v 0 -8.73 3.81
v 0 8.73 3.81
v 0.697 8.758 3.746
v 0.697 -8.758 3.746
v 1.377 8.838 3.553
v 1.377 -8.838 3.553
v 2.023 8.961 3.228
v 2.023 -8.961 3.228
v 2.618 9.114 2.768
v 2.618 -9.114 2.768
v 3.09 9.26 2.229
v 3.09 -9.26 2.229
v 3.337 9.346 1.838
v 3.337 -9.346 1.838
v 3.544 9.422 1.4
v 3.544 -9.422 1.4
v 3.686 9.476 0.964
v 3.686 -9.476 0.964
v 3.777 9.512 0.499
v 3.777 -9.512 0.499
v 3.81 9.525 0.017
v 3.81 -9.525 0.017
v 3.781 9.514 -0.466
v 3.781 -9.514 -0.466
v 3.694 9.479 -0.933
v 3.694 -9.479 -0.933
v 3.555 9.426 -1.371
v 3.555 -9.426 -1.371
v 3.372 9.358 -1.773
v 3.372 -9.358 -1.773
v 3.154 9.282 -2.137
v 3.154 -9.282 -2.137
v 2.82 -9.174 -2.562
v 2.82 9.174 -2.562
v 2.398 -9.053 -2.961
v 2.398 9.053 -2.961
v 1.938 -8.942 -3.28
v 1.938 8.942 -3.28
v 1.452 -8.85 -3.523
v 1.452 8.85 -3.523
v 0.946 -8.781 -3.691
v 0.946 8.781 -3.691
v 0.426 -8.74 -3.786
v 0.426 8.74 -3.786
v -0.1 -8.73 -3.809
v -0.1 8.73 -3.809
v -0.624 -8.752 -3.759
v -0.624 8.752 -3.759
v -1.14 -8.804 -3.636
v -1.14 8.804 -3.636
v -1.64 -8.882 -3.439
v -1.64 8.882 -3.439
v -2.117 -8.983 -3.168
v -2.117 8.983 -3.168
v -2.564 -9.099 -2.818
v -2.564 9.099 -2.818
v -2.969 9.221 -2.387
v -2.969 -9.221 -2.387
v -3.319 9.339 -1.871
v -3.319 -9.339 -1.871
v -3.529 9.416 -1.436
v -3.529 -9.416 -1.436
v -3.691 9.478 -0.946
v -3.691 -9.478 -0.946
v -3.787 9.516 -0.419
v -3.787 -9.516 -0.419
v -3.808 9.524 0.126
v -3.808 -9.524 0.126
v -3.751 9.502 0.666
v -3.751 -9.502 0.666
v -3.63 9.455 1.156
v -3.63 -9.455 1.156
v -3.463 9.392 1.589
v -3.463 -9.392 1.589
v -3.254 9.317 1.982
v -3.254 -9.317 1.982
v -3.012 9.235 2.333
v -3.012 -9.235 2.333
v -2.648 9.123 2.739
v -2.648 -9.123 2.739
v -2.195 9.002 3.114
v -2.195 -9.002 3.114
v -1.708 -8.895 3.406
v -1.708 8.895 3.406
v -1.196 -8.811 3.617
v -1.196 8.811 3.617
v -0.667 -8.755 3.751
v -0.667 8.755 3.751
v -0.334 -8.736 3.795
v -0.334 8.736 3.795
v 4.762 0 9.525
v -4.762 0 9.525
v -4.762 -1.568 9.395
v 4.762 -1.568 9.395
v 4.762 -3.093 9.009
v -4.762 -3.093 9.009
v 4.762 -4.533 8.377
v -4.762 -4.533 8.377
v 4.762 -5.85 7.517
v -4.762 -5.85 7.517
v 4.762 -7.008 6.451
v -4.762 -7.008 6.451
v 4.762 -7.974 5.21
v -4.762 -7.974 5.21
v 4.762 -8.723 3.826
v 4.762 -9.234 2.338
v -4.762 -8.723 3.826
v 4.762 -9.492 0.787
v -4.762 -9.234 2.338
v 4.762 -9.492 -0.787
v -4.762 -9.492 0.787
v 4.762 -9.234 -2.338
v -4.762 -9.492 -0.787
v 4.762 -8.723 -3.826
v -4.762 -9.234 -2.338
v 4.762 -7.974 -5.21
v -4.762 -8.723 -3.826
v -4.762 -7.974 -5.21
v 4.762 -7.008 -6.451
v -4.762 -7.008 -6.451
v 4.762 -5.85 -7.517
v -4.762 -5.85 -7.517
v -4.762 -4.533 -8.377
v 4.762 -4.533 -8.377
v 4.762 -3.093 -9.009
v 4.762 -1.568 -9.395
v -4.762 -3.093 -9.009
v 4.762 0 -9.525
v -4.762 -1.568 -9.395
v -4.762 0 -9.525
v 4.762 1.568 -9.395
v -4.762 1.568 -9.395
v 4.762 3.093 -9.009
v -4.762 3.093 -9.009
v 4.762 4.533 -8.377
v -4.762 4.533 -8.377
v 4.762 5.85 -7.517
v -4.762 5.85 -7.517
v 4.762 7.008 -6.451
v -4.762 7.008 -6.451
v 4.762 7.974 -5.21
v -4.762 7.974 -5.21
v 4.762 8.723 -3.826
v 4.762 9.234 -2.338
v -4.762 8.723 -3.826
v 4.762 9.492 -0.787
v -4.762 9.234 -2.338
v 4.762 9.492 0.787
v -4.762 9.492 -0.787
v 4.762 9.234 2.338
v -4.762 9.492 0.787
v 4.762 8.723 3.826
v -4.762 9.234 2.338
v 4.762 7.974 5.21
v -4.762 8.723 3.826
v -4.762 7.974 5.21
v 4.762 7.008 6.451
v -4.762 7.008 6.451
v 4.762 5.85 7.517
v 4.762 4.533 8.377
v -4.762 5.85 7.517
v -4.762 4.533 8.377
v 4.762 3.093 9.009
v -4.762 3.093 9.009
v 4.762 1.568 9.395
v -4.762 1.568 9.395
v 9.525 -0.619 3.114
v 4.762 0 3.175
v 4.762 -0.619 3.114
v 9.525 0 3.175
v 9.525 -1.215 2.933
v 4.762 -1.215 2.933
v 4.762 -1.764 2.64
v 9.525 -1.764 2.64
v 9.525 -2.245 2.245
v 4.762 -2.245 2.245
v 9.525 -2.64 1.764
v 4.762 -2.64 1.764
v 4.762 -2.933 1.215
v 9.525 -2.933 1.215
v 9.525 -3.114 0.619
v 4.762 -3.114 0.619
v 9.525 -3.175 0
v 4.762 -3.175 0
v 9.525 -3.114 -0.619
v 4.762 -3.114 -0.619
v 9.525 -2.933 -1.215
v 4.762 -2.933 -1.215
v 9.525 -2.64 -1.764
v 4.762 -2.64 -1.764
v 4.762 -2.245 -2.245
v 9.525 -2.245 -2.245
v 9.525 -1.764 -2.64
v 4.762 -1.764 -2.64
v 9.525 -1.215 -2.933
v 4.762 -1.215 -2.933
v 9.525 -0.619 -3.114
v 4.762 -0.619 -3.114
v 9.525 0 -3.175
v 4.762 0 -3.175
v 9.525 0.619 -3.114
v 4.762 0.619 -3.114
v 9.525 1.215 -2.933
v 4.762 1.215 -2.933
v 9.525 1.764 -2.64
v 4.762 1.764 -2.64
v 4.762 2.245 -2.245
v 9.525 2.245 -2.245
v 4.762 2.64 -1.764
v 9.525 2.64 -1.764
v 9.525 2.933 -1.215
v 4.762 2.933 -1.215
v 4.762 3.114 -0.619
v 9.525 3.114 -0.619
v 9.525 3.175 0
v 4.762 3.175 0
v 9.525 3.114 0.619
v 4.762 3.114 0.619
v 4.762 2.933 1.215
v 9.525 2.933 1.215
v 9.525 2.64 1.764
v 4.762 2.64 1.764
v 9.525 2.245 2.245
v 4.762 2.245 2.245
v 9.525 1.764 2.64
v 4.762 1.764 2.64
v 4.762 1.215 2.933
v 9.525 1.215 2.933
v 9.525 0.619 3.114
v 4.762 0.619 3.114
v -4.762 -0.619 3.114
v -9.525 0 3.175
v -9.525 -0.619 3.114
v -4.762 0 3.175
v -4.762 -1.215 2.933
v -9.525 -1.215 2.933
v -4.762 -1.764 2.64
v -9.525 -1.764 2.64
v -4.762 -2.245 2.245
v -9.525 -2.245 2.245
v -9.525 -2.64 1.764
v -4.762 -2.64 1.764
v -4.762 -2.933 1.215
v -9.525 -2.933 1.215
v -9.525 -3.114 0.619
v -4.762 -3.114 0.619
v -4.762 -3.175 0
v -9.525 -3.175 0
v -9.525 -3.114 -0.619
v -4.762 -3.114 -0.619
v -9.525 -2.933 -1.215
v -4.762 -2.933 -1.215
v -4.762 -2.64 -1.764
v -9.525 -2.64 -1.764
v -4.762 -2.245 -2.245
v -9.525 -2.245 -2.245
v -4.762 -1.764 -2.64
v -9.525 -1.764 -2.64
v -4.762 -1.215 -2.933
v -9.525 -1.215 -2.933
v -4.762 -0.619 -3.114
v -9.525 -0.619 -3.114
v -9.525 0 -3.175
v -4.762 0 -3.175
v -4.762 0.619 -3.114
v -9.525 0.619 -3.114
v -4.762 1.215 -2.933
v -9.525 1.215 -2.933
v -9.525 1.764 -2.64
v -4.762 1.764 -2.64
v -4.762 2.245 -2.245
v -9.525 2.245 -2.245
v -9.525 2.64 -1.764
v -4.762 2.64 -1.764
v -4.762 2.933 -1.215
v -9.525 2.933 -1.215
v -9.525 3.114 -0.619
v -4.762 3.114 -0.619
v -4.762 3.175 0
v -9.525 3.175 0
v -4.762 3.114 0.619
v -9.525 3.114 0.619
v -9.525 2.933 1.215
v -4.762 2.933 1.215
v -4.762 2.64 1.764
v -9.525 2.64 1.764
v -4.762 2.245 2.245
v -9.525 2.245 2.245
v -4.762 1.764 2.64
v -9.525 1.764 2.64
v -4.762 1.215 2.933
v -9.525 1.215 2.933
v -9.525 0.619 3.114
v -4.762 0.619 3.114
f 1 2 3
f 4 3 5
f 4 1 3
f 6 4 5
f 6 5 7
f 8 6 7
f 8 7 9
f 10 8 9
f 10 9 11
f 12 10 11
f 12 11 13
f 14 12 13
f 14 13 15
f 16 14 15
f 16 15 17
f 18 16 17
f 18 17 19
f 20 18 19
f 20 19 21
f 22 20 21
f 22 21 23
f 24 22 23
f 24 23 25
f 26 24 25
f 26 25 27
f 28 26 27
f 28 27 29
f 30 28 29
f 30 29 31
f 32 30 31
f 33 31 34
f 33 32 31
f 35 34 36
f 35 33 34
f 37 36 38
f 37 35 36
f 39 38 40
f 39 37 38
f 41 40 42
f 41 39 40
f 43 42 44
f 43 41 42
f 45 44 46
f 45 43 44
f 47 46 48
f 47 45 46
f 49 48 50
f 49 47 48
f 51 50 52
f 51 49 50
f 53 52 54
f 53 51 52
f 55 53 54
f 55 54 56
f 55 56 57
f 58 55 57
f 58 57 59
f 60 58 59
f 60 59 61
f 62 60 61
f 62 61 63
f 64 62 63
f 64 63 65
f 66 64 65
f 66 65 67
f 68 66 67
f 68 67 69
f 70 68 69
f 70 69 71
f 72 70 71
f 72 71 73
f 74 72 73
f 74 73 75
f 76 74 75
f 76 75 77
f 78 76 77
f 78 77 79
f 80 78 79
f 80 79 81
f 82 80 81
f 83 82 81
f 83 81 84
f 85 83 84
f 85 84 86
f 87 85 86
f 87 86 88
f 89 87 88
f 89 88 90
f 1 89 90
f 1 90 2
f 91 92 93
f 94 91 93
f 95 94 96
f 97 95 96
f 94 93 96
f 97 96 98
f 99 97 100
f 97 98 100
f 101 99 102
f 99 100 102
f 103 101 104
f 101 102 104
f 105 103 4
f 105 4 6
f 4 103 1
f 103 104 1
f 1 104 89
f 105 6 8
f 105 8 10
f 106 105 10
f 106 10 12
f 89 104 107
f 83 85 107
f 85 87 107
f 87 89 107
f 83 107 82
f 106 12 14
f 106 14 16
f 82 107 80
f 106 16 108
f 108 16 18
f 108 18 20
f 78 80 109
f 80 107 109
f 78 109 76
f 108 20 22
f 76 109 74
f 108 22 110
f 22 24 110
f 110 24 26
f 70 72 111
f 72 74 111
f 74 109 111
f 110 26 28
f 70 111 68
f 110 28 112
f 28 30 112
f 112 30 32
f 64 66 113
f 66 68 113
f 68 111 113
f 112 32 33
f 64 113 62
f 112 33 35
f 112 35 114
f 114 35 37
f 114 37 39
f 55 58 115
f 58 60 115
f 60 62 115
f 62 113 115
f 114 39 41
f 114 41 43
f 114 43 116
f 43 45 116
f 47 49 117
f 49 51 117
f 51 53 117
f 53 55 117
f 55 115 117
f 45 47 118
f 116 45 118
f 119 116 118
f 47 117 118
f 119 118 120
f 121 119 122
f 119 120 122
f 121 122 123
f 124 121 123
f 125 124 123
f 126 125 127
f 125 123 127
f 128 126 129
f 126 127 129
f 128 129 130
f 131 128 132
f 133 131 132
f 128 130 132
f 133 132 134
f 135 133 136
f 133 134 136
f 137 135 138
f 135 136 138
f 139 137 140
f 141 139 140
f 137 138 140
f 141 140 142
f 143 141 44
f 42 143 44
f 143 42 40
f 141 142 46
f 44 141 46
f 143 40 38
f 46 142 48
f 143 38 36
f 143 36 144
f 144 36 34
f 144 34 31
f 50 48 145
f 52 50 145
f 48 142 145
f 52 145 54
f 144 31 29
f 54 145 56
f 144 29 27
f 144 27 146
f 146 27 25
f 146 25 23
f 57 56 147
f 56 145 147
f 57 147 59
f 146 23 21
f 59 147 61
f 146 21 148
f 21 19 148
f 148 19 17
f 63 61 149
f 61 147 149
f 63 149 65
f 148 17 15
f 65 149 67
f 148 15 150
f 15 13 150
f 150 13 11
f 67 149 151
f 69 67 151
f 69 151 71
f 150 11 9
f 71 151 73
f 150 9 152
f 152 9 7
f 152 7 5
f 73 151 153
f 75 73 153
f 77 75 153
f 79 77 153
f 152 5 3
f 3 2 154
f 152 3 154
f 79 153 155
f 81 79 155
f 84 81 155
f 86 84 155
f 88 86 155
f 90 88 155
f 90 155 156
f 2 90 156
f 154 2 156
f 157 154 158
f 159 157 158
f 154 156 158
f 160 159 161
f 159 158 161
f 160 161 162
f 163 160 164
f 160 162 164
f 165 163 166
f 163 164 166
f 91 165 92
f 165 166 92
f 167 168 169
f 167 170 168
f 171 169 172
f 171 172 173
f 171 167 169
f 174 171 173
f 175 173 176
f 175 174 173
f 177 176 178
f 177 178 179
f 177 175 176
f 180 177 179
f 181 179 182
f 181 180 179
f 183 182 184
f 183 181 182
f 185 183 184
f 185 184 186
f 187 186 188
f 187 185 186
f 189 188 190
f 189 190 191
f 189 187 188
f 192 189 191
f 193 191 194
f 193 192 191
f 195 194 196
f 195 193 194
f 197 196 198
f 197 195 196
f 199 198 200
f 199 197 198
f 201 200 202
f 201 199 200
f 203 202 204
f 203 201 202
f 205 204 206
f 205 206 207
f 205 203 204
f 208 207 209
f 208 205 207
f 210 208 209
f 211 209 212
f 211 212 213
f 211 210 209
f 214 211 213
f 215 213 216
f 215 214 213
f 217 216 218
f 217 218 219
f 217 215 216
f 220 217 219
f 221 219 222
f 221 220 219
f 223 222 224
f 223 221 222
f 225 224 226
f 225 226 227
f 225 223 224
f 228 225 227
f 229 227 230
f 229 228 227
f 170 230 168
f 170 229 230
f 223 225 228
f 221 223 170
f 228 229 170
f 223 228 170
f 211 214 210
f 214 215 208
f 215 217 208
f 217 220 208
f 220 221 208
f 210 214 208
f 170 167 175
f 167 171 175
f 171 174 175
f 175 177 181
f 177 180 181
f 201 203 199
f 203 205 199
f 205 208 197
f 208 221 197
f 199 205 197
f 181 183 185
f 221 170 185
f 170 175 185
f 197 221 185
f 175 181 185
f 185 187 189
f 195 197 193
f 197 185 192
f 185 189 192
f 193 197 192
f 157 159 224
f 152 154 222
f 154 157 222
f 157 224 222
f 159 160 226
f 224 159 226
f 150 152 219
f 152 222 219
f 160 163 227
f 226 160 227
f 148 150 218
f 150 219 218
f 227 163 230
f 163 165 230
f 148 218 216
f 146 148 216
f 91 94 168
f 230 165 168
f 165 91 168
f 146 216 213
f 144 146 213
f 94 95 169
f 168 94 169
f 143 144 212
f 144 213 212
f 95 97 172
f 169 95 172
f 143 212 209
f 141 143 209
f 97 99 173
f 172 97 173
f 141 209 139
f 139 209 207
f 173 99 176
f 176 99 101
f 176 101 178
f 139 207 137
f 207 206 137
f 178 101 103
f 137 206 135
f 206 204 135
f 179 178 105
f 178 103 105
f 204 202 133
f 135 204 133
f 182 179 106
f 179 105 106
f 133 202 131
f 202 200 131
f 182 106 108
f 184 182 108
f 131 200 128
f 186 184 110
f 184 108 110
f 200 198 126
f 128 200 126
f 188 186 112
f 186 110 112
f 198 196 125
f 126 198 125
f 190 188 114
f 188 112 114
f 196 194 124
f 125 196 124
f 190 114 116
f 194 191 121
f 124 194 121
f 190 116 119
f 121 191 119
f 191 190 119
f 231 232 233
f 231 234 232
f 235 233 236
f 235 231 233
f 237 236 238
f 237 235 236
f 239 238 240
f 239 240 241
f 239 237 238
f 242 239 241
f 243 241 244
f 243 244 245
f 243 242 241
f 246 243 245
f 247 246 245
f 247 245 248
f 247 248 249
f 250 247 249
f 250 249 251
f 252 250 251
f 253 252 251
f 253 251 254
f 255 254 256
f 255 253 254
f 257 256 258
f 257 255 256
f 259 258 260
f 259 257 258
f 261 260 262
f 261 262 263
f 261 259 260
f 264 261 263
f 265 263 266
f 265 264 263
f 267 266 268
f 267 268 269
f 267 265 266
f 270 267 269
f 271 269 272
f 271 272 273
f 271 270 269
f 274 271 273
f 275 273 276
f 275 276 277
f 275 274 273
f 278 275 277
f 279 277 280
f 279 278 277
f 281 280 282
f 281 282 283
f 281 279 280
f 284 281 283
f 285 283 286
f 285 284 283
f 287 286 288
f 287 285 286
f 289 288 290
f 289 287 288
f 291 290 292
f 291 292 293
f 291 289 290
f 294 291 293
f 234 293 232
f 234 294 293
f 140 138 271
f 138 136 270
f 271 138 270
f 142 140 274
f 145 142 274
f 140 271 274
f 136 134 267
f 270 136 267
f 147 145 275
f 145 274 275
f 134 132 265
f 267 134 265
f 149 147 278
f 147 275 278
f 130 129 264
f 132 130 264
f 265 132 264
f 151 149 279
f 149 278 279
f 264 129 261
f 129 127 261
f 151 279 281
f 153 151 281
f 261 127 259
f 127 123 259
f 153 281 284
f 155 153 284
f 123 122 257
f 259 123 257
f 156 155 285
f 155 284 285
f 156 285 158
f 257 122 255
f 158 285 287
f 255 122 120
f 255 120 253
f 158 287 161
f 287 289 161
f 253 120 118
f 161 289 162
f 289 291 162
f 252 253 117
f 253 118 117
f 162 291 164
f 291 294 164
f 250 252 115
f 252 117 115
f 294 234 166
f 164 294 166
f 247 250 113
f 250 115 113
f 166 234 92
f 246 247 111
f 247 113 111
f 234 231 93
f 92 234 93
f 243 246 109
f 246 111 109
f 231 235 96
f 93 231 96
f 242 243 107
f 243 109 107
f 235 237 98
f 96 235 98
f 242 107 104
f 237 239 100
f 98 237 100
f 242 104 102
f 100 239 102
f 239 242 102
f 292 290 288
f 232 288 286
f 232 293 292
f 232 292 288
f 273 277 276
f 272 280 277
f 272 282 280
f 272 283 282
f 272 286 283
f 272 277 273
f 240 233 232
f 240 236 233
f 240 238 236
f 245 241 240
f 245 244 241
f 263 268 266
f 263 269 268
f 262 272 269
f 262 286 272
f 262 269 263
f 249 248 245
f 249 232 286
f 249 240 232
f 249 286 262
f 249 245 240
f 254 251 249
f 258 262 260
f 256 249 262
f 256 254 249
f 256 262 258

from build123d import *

# Parameters (mm, degrees)
SKETCH1_W               = 4.7625
SKETCH1_H               = 3.175
CUT_EXTRUDE1_DEPTH      = 17.497783942
CUT_EXTRUDE1_DEPTH_BACK = 17.497783942
SKETCH2_R               = 3.81


with BuildPart() as part:
    # Sketch1 → Revolve1 (revolve)
    with BuildSketch(Plane.XY, mode=Mode.PRIVATE) as revolve1_sk:
        Polygon((-4.7625, 0), (0, 0), (0, 9.525), (-4.7625, 9.525), (-4.7625, 3.175), align=None)
        with Locations((7.14375, 1.5875)):
            Rectangle(SKETCH1_W, SKETCH1_H)
        with Locations((-7.14375, 1.5875)):
            Rectangle(SKETCH1_W, SKETCH1_H)
        Polygon((0, 9.525), (0, 0), (4.7625, 0), (4.7625, 3.175), (4.7625, 9.525), align=None)
    revolve(revolve1_sk.sketch.rotate(Axis((-4.7625, 0, 0), (1, 0, 0)), 90), axis=Axis((-4.7625, 0, 0), (1, 0, 0)))

    # Sketch2 → Cut-Extrude1 (cut, two sides: drawn at the far end of the back side and taken through both)
    with BuildSketch(Plane(origin=(0, 0, 0), x_dir=(1, 0, 0), z_dir=(0, 1, 0)).offset(-CUT_EXTRUDE1_DEPTH_BACK)):
        with Locations(Location((0, 0, 0), (0, 0, 270))):
            Circle(SKETCH2_R)
    extrude(amount=CUT_EXTRUDE1_DEPTH + CUT_EXTRUDE1_DEPTH_BACK, mode=Mode.SUBTRACT)


solid = part.part
